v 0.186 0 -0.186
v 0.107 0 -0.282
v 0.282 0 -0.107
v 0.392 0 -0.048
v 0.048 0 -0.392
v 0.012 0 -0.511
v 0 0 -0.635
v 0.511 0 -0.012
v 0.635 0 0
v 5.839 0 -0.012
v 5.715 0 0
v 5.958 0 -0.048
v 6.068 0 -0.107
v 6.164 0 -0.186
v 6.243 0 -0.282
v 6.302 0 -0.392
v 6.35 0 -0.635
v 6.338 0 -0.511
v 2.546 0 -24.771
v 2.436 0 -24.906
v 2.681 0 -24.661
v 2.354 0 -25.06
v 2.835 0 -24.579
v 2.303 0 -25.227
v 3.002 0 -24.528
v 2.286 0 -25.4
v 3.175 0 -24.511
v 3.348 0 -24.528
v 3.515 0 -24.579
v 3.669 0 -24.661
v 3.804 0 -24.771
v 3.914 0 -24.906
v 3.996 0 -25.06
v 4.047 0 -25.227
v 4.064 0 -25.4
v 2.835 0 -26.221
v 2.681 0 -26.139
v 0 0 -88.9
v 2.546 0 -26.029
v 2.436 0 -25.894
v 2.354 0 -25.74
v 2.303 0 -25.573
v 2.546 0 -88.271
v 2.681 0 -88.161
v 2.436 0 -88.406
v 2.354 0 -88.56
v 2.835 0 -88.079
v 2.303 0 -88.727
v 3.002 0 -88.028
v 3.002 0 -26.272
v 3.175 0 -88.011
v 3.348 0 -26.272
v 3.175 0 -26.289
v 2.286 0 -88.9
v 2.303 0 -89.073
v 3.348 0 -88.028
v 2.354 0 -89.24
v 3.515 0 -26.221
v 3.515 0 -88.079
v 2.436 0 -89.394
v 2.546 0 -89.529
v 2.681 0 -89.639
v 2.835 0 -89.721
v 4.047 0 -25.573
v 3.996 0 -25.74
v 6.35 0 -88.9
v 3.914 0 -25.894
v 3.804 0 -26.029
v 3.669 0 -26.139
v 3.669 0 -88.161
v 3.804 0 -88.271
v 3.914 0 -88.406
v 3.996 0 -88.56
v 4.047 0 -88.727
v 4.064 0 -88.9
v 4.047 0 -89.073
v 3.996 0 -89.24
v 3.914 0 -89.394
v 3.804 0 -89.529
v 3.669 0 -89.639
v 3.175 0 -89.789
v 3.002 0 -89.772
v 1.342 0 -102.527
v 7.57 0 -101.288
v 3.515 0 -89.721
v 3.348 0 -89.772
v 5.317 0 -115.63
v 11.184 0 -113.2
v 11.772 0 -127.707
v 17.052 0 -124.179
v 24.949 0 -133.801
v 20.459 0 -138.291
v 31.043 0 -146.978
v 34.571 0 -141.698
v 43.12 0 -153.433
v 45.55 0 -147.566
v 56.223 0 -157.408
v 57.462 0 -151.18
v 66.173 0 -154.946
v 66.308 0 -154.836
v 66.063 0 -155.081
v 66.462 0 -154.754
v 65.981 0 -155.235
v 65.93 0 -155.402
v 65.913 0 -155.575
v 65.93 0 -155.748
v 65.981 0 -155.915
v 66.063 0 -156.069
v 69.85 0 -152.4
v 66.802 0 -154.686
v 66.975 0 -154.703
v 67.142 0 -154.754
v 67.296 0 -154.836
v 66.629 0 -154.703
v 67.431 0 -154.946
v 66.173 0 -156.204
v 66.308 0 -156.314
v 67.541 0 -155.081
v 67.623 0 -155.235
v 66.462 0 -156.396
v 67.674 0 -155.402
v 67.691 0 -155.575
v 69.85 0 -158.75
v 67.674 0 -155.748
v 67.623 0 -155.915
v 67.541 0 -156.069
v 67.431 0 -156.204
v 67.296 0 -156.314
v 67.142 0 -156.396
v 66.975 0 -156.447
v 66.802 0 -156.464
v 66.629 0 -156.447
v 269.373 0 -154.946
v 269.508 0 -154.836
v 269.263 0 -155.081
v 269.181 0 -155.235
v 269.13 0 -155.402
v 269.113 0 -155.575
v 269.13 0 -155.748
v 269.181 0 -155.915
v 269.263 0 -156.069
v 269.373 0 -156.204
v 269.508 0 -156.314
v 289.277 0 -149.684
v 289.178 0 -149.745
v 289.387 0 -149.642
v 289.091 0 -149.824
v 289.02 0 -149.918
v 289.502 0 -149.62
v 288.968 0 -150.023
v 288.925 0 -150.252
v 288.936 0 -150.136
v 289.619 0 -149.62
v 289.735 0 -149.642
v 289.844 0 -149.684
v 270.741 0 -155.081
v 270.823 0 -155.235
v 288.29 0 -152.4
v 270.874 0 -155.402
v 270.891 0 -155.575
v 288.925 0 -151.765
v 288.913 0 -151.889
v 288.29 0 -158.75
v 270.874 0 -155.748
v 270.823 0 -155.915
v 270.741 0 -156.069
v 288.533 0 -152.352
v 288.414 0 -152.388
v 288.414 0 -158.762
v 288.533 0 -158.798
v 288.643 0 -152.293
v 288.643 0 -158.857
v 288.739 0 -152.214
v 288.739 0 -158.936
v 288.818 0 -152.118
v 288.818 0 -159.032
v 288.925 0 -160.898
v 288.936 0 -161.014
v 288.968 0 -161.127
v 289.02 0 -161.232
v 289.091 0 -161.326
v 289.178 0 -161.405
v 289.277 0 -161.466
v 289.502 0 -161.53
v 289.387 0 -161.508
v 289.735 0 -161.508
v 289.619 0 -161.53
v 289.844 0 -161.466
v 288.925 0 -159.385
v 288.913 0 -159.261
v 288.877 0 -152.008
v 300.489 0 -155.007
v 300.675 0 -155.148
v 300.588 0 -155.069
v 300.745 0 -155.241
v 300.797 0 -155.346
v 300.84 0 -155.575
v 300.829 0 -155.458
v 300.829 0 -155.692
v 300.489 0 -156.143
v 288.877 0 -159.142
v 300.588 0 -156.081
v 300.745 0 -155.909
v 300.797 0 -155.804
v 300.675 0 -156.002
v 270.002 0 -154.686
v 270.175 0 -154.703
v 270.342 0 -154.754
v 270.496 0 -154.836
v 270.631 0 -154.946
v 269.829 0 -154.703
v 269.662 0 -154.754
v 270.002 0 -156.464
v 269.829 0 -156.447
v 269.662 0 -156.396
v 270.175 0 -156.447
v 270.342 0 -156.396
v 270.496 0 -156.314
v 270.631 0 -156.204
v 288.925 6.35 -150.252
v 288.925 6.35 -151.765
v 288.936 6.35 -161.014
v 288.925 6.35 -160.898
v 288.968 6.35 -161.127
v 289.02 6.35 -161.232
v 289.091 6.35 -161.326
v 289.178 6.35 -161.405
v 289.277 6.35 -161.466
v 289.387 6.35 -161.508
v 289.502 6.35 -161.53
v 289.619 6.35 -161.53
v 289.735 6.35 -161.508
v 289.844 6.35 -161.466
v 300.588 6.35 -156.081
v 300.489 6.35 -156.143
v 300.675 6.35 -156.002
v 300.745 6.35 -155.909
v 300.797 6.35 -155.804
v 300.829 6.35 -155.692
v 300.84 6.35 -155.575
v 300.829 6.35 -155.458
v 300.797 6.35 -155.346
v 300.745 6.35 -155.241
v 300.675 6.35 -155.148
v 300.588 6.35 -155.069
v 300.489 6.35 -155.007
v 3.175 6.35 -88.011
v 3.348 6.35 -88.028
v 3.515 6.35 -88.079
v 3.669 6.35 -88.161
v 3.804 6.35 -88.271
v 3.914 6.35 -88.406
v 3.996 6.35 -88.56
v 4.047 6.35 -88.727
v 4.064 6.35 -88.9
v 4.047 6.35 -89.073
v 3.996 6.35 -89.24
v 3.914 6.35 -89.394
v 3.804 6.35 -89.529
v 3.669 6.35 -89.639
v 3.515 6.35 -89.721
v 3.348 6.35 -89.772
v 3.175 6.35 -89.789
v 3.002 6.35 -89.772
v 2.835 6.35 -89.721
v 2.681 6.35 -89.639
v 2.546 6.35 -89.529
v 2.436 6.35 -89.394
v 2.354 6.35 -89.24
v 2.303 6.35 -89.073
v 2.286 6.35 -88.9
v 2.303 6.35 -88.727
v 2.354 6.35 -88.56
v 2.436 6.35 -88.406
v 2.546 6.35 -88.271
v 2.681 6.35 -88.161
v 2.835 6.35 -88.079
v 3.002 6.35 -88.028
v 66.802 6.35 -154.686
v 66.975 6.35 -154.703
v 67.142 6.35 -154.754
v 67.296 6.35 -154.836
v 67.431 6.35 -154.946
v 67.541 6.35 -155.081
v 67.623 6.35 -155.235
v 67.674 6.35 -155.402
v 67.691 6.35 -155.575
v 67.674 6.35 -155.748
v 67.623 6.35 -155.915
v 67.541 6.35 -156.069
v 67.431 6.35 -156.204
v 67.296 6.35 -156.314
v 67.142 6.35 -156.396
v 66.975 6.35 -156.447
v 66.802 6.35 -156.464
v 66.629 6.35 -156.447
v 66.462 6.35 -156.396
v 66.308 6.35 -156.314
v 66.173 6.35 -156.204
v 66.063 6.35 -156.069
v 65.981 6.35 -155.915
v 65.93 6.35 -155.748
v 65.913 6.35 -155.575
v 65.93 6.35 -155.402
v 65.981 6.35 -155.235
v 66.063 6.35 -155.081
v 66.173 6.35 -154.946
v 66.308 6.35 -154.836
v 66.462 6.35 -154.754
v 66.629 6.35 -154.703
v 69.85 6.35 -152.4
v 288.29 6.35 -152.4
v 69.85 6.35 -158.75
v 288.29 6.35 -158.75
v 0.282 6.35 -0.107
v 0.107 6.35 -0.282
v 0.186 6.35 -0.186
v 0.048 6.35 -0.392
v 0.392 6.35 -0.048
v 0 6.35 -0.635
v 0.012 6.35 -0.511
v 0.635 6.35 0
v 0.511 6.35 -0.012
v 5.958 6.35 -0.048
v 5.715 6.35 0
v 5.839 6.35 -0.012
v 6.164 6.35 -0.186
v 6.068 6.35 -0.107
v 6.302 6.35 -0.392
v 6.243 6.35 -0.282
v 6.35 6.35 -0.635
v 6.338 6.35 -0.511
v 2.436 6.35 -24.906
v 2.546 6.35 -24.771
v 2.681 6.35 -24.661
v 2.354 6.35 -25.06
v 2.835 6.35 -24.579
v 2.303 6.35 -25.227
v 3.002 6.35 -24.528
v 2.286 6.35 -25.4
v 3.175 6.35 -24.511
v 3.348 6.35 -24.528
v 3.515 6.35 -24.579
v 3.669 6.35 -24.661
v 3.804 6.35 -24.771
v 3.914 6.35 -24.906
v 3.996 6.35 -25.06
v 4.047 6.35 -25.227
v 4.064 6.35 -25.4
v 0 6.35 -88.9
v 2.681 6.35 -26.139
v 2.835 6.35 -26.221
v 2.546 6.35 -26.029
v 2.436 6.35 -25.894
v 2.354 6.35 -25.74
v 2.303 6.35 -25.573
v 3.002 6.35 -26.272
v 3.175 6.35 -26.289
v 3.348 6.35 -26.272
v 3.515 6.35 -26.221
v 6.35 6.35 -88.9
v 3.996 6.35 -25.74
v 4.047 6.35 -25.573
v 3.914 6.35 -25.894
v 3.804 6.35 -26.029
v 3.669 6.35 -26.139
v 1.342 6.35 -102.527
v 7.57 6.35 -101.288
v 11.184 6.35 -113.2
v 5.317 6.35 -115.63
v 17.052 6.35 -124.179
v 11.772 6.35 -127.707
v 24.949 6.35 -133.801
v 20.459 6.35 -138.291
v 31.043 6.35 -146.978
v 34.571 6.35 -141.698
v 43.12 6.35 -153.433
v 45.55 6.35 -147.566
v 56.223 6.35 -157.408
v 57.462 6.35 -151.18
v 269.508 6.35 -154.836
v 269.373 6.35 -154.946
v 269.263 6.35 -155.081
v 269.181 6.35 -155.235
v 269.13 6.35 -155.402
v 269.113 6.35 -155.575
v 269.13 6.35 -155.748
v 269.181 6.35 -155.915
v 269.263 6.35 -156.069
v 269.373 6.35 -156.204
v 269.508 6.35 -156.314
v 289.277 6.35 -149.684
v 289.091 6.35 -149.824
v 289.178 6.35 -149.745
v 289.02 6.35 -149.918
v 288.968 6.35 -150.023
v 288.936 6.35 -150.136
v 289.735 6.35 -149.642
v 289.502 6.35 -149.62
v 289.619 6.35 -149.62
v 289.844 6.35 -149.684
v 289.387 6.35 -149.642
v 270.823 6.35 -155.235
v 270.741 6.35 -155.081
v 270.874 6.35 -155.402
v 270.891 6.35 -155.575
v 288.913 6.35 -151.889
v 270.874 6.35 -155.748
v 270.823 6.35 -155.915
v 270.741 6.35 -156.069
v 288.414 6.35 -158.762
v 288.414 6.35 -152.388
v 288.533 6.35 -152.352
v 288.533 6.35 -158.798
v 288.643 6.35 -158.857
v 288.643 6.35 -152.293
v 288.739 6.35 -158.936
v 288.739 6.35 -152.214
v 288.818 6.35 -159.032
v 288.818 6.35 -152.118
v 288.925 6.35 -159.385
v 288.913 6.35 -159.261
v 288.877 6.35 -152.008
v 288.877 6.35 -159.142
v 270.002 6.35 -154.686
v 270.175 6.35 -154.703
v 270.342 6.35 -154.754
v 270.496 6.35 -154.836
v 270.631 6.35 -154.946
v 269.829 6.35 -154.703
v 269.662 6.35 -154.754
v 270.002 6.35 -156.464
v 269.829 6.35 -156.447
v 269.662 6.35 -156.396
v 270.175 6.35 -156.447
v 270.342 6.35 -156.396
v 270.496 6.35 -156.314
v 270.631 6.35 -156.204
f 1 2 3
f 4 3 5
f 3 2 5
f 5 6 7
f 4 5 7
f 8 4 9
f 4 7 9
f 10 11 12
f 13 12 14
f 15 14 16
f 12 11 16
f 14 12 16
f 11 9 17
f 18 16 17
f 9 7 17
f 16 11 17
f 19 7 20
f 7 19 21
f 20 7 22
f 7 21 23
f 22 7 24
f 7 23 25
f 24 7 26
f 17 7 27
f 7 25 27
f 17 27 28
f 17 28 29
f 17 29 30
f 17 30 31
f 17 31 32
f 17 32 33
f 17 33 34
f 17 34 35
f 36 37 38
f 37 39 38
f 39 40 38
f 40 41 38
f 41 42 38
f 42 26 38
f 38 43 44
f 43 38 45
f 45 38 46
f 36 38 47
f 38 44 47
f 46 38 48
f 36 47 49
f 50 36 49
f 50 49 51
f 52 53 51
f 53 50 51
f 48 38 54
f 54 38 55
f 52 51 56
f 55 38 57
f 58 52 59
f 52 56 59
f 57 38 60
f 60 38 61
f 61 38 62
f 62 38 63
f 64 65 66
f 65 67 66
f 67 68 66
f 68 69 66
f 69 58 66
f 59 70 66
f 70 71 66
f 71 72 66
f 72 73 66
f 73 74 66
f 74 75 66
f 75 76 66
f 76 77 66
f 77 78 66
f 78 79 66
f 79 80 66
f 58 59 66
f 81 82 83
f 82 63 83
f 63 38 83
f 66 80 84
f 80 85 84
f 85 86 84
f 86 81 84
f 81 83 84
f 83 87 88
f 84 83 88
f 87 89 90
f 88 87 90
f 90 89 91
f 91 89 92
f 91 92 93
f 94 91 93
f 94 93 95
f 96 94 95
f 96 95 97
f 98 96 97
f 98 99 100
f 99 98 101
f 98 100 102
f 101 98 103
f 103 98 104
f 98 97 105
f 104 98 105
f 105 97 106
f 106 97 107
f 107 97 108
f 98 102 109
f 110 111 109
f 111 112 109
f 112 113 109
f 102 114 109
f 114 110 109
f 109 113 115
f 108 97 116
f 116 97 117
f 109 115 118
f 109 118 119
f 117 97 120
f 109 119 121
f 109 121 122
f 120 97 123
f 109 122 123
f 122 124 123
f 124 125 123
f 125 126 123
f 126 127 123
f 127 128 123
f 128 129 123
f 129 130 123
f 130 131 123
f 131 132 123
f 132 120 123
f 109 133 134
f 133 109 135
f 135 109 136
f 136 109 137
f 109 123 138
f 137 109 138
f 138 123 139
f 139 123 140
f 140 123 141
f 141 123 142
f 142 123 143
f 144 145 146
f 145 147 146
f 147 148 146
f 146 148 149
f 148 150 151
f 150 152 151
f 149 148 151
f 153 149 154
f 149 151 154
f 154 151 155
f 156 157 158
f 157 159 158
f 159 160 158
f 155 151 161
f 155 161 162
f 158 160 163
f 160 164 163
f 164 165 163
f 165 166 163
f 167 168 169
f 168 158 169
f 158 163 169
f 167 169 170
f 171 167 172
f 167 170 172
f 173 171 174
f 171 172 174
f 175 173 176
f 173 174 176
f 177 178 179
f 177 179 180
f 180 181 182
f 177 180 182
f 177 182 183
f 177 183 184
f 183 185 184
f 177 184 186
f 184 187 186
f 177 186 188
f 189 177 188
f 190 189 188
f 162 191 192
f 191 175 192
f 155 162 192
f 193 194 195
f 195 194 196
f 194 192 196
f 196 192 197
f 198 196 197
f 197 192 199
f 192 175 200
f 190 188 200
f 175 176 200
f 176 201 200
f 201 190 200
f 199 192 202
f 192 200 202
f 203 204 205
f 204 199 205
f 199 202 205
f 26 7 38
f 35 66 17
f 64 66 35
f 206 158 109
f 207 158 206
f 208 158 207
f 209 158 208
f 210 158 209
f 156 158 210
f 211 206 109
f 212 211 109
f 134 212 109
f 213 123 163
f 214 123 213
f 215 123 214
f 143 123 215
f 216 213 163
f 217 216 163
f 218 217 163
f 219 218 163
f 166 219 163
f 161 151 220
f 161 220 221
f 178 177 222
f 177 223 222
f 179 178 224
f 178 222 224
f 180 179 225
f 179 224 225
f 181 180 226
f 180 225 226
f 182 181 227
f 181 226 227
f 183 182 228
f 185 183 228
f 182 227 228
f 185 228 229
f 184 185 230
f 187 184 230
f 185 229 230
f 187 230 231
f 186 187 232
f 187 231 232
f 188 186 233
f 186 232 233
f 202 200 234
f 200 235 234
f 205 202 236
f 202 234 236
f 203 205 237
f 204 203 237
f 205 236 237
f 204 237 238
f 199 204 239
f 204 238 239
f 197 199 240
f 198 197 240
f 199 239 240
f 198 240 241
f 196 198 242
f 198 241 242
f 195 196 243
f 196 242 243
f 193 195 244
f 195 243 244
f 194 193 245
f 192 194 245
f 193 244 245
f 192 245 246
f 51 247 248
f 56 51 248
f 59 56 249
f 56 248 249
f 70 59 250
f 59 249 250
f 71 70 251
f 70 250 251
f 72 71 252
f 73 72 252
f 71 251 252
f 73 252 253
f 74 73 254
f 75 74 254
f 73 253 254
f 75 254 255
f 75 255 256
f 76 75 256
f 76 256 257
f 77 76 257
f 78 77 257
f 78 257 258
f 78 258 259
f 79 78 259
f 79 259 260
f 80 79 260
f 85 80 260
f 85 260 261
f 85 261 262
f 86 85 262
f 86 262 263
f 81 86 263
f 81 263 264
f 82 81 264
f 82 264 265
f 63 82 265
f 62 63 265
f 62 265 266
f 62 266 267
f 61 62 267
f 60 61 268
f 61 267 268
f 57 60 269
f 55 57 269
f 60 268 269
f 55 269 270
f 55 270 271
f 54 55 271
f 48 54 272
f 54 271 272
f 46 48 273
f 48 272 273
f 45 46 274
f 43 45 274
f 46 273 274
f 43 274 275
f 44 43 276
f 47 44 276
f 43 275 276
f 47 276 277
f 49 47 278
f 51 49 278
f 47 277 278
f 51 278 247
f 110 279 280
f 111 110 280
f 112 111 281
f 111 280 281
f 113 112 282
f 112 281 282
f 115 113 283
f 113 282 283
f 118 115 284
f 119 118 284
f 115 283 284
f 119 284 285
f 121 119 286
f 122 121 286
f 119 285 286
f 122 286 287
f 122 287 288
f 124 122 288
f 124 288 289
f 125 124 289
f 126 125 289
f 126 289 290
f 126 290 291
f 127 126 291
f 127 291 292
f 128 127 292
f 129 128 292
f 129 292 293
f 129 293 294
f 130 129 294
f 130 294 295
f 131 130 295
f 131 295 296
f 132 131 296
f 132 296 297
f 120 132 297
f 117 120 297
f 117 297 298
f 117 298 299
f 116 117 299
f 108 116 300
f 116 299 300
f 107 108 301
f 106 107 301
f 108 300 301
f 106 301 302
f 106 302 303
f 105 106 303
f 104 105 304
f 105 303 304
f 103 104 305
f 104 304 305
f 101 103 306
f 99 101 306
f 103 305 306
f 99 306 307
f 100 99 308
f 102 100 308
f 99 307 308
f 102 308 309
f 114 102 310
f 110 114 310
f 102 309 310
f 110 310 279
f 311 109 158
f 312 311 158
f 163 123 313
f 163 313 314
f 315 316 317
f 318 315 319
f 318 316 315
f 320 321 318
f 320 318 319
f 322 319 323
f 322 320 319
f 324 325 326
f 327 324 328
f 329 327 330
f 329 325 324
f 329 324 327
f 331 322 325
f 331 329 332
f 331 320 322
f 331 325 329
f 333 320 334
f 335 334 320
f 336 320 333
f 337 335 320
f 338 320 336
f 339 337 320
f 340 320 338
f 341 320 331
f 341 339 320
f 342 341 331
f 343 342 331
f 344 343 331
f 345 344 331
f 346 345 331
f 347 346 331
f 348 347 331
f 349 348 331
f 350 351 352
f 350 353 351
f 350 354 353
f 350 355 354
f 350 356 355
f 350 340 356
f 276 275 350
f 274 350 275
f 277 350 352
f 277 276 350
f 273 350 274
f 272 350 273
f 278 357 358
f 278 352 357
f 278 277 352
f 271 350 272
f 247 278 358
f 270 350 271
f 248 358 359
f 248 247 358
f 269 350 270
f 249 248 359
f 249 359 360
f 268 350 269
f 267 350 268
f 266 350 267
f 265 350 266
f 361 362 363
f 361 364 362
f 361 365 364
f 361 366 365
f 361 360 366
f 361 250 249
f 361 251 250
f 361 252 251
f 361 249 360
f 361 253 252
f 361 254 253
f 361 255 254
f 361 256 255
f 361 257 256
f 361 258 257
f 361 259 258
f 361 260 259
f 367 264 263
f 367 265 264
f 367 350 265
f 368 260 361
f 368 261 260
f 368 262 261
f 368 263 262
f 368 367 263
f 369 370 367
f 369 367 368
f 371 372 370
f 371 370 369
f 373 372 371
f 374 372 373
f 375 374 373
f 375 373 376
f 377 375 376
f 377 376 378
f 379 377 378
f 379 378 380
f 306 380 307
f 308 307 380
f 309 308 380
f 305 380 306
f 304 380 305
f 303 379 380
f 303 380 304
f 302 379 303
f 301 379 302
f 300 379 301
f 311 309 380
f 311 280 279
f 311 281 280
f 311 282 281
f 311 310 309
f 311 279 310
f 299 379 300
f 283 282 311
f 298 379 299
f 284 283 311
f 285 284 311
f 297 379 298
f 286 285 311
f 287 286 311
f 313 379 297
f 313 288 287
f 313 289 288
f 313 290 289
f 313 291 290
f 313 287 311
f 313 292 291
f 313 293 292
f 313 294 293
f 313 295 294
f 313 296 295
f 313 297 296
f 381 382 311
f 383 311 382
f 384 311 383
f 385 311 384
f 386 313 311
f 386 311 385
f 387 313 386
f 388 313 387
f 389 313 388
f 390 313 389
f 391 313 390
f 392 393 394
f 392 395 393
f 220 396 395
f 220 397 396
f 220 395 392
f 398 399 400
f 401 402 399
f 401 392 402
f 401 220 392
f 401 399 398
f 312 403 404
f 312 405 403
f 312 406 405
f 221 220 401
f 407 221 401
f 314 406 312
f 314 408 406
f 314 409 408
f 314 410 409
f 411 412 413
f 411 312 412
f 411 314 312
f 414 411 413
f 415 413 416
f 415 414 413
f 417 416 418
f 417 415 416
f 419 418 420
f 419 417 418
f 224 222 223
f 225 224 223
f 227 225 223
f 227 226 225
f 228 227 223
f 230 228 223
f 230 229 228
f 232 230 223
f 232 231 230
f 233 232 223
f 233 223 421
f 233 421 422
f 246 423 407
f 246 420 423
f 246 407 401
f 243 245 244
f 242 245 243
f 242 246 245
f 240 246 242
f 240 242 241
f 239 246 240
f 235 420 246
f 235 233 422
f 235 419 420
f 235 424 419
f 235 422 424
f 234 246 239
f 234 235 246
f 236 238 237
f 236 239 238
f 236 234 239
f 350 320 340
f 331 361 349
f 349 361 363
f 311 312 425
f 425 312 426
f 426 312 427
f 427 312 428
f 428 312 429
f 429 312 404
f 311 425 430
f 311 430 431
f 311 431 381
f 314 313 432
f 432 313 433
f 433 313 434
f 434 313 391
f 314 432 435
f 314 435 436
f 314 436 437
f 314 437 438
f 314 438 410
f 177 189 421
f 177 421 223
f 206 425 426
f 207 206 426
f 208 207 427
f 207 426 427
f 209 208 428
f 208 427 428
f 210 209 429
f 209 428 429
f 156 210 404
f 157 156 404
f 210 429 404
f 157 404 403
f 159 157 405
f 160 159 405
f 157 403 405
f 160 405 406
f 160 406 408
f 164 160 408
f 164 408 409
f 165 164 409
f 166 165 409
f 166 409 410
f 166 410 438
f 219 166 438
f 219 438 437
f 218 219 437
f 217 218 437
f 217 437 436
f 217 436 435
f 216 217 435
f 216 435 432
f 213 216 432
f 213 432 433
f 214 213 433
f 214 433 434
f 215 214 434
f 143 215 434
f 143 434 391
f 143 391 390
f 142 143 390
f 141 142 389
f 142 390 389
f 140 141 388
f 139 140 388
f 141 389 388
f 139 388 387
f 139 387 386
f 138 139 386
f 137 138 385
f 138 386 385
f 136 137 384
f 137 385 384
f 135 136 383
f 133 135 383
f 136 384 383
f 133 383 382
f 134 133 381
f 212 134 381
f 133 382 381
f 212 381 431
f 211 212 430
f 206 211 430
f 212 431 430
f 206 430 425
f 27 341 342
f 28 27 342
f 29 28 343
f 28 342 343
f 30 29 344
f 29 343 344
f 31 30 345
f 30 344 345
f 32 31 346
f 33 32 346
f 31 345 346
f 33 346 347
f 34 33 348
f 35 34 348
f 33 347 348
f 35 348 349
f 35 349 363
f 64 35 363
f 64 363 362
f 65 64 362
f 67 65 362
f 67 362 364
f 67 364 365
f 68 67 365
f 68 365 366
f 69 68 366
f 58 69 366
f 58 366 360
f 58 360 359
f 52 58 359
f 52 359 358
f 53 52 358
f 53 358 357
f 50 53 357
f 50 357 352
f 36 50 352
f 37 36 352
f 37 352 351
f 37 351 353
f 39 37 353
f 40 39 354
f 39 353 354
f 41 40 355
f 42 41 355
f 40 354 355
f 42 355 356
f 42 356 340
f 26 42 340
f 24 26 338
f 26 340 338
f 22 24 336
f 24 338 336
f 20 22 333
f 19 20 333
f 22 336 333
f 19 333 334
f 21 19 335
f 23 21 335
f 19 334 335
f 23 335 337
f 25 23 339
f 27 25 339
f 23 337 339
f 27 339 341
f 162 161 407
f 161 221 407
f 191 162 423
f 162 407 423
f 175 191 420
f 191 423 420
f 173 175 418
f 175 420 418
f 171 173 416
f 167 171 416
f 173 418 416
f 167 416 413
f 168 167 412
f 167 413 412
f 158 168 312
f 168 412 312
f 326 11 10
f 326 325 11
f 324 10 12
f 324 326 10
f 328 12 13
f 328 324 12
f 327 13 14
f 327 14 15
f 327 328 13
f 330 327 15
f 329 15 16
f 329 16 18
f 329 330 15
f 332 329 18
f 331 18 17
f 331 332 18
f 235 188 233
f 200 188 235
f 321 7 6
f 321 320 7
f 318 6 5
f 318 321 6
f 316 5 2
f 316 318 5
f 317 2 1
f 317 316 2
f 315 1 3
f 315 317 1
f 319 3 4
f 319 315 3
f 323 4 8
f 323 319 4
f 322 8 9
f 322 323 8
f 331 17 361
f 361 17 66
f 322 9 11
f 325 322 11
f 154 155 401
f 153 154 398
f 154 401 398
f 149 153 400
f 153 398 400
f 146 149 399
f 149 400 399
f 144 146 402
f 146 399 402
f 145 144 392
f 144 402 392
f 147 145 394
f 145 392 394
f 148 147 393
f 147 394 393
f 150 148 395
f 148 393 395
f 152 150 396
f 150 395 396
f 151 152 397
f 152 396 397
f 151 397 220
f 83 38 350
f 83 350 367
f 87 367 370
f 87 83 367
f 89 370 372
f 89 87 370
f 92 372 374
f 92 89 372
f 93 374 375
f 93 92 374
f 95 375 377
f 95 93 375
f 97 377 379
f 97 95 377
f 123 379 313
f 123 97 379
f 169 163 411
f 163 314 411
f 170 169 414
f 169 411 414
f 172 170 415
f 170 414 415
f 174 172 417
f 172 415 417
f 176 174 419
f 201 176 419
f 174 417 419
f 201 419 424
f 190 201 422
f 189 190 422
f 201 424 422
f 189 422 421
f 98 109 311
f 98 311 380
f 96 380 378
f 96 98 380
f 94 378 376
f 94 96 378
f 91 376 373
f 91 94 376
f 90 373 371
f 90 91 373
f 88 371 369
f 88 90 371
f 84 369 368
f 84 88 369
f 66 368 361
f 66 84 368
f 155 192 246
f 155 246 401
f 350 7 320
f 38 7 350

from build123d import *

# Parameters (mm, degrees)
SKETCH1_W               = 6.35
SKETCH1_H               = 88.9
SKETCH1_W_2             = 231.775
SKETCH1_H_2             = 6.35
SKETCH1_W_3             = 12.7
SKETCH1_H_3             = 12.7
BOSS_EXTRUDE1_DEPTH     = 6.35
CUT_EXTRUDE1_DEPTH      = 343.399866749
CUT_EXTRUDE1_DEPTH_BACK = 343.399866749
FILLET1_R               = 0.635
SKETCH3_R               = 0.889
CUT_EXTRUDE2_DEPTH      = 342.522840468


with BuildPart() as part:
    # Sketch1 → Boss-Extrude1 (new body)
    with BuildSketch(Plane(origin=(0, 0, 0), x_dir=(1, 0, 0), z_dir=(0, 1, 0))):
        with Locations((3.175, 44.45)):
            Rectangle(SKETCH1_W, SKETCH1_H)
        with BuildLine():
            ThreePointArc((0, 88.9), (20.458591334, 138.291408666), (69.85, 158.75))
            Line((69.85, 158.75), (69.85, 152.4))
            ThreePointArc((69.85, 152.4), (24.948719395, 133.801280605), (6.35, 88.9))
            Line((6.35, 88.9), (0, 88.9))
        make_face()
        with Locations((185.7375, 155.575)):
            Rectangle(SKETCH1_W_2, SKETCH1_H_2)
        with Locations((295.275, 155.575)):
            Rectangle(SKETCH1_W_3, SKETCH1_H_3)
    extrude(amount=BOSS_EXTRUDE1_DEPTH)

    # Sketch2 → Cut-Extrude1 (cut, two sides: drawn at the far end of the back side and taken through both)
    with BuildSketch(Plane(origin=(0, 6.35, 0), x_dir=(1, 0, 0), z_dir=(0, 1, 0)).offset(-CUT_EXTRUDE1_DEPTH_BACK)):
        Polygon((301.625, 161.925), (288.925, 161.925), (301.625, 155.575), align=None)
        Polygon((301.625, 149.225), (301.625, 155.575), (288.925, 149.225), align=None)
    extrude(amount=CUT_EXTRUDE1_DEPTH + CUT_EXTRUDE1_DEPTH_BACK, mode=Mode.SUBTRACT)

    # Fillet1
    fillet1_edges = [part.edges().sort_by_distance(p)[0] for p in [
        (0, 3.175, 0),
        (288.925, 3.175, -158.75),
        (288.925, 3.175, -152.4),
        (6.35, 3.175, 0),
        (288.925, 3.175, -161.925),
        (288.925, 3.175, -149.225),
        (301.625, 3.175, -155.575),
    ]]
    fillet(fillet1_edges, radius=FILLET1_R)

    # Sketch3 → Cut-Extrude2 (cut, through all)
    with BuildSketch(Plane(origin=(0, 6.35, 0), x_dir=(1, 0, 0), z_dir=(0, 1, 0))):
        with Locations(Location((3.175, 25.4, 0), (0, 0, 270))):
            Circle(SKETCH3_R)
        with Locations(Location((3.175, 88.9, 0), (0, 0, 270))):
            Circle(SKETCH3_R)
        with Locations(Location((66.802, 155.575, 0), (0, 0, 270))):
            Circle(SKETCH3_R)
        with Locations(Location((270.002, 155.575, 0), (0, 0, 270))):
            Circle(SKETCH3_R)
    extrude(amount=-CUT_EXTRUDE2_DEPTH, mode=Mode.SUBTRACT)


solid = part.part
